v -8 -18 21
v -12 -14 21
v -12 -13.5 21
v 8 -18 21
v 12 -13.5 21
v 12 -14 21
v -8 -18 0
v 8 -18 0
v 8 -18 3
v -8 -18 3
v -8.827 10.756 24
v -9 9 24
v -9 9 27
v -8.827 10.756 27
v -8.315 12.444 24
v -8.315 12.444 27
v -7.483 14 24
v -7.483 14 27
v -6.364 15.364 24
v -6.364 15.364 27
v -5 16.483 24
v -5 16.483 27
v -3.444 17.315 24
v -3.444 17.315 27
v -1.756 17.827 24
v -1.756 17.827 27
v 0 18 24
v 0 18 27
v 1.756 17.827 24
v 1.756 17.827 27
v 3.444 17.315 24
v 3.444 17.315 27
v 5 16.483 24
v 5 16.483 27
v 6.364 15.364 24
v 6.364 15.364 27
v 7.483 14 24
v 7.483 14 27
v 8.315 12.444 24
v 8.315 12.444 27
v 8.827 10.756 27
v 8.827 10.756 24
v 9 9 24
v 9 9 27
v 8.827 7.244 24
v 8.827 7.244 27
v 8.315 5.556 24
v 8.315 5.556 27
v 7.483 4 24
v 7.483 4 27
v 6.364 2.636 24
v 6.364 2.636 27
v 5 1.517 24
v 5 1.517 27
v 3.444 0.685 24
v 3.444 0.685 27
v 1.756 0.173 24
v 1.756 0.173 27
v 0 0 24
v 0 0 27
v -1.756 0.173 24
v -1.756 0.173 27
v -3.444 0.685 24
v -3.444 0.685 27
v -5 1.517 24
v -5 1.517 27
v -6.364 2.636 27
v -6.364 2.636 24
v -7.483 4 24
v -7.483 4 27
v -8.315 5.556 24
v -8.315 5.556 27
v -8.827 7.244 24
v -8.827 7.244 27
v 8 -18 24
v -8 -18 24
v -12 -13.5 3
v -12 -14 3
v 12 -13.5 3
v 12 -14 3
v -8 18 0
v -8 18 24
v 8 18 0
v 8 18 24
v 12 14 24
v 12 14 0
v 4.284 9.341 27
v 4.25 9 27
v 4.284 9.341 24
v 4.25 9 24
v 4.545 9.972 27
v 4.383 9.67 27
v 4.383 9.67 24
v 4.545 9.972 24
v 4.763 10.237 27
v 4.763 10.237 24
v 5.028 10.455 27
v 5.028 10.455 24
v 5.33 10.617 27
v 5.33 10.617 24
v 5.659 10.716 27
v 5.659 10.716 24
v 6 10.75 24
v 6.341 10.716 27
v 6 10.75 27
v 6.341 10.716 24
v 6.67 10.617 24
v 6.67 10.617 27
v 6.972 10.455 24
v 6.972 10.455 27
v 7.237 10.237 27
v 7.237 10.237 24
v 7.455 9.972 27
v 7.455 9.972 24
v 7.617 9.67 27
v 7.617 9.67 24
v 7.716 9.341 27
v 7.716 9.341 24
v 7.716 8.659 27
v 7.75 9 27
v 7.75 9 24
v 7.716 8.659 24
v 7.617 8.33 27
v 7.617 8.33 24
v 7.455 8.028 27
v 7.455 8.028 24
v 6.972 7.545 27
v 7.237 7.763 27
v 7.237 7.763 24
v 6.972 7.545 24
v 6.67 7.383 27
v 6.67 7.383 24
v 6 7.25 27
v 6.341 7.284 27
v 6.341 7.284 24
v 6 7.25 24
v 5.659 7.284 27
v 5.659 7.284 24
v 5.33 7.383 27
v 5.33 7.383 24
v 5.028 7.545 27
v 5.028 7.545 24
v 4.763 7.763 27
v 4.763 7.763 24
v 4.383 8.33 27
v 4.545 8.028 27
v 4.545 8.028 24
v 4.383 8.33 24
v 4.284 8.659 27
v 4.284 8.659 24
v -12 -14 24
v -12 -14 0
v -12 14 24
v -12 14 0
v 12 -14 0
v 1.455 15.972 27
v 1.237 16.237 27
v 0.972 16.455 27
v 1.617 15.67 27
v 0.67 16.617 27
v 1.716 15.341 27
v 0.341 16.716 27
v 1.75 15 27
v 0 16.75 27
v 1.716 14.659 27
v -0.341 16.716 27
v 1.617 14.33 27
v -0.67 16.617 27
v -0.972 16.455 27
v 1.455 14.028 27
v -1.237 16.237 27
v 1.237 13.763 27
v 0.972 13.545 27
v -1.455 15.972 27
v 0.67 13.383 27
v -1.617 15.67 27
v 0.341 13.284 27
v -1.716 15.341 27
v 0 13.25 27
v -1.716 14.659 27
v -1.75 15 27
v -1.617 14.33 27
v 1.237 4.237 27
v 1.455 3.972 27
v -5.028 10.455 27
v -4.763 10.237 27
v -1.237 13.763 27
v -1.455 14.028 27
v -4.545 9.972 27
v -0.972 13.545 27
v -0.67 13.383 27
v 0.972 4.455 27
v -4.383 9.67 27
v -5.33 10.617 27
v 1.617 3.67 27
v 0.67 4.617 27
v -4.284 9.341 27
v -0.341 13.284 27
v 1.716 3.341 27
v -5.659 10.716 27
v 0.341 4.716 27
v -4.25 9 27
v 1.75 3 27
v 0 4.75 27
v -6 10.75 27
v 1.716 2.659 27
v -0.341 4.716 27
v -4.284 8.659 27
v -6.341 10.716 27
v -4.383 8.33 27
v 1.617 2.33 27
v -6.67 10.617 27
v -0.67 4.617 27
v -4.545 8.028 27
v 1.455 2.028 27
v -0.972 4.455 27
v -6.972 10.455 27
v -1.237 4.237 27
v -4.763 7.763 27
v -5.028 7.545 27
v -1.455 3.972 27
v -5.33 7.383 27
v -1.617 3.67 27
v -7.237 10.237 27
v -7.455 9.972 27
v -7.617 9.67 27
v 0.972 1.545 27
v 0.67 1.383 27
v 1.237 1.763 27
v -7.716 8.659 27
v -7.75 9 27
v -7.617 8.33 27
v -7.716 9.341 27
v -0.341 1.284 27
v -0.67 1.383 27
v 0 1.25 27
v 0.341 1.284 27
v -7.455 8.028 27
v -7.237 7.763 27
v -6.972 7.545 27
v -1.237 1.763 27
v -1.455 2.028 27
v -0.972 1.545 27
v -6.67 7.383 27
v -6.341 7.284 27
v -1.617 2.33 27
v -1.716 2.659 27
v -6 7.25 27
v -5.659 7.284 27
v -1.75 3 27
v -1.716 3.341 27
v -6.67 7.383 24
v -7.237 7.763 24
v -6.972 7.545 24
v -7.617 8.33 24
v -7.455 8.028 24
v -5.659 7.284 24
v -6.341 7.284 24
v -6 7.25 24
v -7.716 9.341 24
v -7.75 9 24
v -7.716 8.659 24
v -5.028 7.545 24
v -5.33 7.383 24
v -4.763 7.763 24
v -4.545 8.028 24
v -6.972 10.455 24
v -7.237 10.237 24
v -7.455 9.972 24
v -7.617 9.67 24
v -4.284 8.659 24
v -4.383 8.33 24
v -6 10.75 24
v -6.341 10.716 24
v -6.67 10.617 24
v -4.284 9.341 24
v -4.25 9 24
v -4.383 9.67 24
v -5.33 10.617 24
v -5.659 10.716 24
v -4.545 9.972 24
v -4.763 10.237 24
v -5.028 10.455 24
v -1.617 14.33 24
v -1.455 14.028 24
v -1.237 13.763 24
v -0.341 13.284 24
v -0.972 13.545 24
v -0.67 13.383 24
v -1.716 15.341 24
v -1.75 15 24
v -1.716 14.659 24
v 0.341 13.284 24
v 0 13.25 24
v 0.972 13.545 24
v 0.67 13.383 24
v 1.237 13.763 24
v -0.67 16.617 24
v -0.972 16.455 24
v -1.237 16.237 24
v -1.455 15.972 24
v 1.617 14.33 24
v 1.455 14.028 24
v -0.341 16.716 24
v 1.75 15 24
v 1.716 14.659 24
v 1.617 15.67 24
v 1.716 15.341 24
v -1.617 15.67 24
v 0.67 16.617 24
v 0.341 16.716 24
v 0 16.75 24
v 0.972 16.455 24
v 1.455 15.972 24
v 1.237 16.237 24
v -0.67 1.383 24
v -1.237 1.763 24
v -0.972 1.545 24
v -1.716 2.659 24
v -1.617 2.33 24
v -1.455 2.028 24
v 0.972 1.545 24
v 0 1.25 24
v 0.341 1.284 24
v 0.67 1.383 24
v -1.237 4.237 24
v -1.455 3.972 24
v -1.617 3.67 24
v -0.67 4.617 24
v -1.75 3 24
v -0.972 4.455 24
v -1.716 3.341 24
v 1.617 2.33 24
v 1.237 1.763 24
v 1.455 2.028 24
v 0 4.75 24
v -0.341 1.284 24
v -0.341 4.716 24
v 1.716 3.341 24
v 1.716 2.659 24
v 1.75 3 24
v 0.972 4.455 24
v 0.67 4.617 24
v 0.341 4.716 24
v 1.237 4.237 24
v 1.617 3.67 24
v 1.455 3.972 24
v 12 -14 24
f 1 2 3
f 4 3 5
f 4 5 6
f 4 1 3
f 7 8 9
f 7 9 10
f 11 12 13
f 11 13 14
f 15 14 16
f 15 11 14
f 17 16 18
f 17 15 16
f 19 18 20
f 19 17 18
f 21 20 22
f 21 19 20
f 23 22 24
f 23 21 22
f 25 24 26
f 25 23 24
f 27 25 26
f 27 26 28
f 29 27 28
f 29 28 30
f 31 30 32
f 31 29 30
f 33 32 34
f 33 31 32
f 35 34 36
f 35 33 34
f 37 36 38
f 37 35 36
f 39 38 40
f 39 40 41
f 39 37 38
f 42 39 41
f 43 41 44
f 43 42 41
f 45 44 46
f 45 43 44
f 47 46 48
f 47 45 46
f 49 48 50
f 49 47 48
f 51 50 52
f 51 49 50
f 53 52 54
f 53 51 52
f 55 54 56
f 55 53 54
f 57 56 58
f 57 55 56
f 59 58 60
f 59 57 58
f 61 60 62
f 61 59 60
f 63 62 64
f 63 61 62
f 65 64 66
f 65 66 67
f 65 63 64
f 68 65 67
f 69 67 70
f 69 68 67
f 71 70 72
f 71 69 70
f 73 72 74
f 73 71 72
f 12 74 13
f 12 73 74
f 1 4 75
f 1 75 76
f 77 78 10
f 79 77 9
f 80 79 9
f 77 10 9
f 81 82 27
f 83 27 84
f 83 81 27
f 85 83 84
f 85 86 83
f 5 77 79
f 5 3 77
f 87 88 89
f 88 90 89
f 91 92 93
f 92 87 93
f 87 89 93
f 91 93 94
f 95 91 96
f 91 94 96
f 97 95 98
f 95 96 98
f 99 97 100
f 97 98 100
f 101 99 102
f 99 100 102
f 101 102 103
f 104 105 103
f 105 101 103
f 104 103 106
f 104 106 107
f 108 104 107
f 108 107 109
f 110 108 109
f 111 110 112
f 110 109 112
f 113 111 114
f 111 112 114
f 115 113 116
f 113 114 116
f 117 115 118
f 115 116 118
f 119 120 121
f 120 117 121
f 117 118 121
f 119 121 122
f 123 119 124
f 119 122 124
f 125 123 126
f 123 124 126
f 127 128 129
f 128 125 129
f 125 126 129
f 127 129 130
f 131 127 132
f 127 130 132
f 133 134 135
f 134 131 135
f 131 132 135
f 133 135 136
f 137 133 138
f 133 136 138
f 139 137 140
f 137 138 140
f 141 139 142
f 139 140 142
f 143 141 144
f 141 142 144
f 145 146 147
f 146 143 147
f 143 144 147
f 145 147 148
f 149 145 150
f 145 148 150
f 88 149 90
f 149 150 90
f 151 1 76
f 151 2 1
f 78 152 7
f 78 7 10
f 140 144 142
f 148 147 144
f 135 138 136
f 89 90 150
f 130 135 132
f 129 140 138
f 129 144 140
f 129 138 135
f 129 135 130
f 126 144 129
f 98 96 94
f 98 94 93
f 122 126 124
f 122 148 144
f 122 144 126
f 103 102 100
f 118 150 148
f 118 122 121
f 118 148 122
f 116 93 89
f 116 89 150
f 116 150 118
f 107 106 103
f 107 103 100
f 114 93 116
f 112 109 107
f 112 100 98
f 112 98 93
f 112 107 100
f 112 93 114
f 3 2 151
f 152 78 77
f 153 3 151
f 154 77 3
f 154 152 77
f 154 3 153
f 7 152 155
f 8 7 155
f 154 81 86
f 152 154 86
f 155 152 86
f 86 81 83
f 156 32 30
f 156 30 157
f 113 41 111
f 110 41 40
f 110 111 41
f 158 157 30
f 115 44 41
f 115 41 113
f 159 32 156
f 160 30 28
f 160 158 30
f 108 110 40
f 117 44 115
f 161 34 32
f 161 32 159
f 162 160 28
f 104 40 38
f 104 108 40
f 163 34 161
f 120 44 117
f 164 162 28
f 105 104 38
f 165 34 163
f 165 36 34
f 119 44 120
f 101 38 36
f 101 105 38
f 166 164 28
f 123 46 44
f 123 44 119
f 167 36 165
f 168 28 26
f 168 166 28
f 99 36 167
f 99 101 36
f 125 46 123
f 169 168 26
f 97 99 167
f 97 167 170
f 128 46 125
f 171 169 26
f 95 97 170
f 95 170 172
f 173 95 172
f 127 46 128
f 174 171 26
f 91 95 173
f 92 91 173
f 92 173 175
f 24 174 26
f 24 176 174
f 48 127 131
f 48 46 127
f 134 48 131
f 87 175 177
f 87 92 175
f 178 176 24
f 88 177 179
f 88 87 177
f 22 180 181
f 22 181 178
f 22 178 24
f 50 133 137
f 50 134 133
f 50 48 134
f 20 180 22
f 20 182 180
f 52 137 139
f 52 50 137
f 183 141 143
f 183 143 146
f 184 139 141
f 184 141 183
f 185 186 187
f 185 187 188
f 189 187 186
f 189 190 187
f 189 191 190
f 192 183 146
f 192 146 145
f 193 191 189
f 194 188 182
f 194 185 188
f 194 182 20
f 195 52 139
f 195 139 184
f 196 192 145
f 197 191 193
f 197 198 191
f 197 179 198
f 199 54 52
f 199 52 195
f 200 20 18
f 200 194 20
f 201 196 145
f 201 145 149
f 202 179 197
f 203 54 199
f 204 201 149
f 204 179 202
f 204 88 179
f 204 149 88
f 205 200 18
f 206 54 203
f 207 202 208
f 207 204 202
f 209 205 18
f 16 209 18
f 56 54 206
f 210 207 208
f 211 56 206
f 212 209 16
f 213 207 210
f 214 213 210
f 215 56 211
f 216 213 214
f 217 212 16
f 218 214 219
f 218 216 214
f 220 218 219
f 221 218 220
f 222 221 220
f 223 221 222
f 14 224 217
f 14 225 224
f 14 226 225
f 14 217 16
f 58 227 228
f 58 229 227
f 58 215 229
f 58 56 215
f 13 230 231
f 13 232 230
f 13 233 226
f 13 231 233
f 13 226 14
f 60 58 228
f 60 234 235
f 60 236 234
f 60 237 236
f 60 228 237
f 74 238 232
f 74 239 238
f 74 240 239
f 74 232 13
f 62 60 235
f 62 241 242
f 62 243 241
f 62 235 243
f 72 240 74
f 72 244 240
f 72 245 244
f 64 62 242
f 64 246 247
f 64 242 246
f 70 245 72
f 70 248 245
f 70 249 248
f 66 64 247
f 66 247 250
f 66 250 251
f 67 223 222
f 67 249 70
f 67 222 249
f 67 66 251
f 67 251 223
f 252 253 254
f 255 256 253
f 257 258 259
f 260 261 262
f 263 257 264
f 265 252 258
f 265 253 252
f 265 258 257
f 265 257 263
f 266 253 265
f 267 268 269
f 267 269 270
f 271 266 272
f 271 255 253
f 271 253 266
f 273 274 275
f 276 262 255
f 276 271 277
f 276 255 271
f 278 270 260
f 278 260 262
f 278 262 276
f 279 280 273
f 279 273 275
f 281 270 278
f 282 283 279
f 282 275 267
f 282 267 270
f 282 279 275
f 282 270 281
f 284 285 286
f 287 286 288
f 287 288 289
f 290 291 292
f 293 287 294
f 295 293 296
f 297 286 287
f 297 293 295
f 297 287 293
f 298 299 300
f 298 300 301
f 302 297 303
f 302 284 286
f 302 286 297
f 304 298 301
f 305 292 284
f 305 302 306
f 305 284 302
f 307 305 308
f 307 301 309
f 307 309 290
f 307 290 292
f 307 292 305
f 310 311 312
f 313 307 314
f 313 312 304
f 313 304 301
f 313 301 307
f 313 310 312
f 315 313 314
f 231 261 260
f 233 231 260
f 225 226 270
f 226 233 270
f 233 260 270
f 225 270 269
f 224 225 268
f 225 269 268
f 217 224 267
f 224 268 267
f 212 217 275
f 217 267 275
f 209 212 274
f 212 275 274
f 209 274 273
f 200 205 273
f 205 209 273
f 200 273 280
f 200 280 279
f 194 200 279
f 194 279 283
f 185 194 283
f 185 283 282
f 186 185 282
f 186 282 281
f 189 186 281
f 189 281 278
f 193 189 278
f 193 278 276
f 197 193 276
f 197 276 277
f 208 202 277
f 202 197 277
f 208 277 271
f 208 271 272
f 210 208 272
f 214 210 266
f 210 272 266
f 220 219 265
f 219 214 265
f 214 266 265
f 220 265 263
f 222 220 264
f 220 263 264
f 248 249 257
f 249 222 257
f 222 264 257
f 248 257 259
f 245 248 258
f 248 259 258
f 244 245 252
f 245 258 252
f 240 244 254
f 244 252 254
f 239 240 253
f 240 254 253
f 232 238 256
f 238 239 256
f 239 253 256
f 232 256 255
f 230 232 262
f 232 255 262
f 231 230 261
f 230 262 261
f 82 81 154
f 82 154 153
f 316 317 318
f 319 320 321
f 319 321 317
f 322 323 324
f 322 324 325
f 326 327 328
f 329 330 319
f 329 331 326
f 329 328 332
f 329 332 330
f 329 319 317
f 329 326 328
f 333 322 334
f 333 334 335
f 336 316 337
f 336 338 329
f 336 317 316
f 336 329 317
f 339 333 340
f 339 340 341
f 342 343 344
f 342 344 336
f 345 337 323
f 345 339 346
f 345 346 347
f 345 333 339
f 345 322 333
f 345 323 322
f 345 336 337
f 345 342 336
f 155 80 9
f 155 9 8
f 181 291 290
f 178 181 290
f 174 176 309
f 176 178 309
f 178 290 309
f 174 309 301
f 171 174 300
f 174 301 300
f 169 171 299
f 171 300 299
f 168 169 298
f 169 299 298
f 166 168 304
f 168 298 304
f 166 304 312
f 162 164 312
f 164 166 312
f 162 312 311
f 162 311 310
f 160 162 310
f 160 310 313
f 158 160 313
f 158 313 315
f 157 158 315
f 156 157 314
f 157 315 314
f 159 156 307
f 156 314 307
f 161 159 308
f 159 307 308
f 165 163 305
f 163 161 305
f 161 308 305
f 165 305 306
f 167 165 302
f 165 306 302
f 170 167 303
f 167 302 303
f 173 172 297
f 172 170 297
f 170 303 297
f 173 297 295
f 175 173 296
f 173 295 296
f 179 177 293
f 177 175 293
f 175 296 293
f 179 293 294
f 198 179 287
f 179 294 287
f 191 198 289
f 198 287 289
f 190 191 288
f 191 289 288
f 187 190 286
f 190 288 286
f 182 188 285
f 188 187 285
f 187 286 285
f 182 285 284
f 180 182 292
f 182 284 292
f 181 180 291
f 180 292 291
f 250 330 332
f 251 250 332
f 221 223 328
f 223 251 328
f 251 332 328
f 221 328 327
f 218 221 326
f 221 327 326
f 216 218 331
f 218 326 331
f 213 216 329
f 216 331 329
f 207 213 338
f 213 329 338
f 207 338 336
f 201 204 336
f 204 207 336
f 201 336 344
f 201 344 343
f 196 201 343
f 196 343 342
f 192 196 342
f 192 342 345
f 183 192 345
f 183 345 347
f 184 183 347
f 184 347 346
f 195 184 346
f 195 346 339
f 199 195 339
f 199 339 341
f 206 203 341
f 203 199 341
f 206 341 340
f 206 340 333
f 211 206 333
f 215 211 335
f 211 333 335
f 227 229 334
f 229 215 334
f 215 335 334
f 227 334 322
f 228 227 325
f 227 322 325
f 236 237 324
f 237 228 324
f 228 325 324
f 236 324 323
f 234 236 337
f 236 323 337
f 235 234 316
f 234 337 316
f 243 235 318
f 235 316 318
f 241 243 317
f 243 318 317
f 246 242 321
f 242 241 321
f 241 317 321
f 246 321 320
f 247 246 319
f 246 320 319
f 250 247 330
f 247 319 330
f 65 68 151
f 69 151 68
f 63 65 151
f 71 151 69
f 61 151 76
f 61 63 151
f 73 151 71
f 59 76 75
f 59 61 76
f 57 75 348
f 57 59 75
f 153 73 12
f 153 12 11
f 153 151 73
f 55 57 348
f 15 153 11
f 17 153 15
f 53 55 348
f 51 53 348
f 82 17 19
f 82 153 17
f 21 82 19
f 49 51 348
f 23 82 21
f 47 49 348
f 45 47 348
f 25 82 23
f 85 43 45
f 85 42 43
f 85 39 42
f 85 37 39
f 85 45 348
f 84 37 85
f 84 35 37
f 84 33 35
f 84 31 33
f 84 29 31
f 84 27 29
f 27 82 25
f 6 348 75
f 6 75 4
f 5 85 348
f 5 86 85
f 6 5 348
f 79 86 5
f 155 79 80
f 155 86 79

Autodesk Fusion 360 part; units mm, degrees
sketch "Sketch1" plane through (0, 0, 0) normal (0, 0, 1) x (1, 0, 0)
  line L0 (12, -18) -> (-12, -18)
  line L1 (-12, -18) -> (-12, 18)
  line L2 (-12, 18) -> (12, 18)
  line L3 (12, 18) -> (12, -18)
  line L4 (12, -18) -> (-12, 18) construction
  line L5 (-12, -18) -> (12, 18) construction
  dimension "d1" = 36
  dimension "d2" = 24
extrude "Extrude1" add sketch "Sketch1" along normal blind 24
chamfer "Chamfer1" distance 4 angle 45 4 edges at (12, -18, 12) (12, 18, 12) (-12, -18, 12) (-12, 18, 12)
sketch "Sketch2" plane through (0, 0, 24) normal (0, 0, 1) x (-1, 0, 0)
  line L0 (8, -18) -> (12, -14)
  line L1 (12, -14) -> (12, 14)
  line L2 (12, 14) -> (8, 18)
  line L3 (8, 18) -> (-8, 18)
  line L4 (-8, 18) -> (-12, 14)
  line L5 (-12, 14) -> (-12, -14)
  line L6 (-12, -14) -> (-8, -18)
  line L7 (-8, -18) -> (8, -18)
  circle A0 centre (0, -9) radius 9
  circle A1 centre (0, -9) radius 6 construction
  line L8 (0, 0) -> (0, -18) construction
  circle A2 centre (0, -15) radius 1.75
  circle A3 centre (6, -9) radius 1.75
  circle A4 centre (0, -3) radius 1.75
  circle A5 centre (-6, -9) radius 1.75
  dimension "d6" = 18
  dimension "d7" = 12
  dimension "d8" = 3.5
  dimension "d10" = 360
extrude "Extrude2" add sketch "Sketch2" along normal blind 3 contours A0
sketch "Sketch3" plane through (0, -18, 0) normal (0, -1, 0) x (1, 0, 0)
  line L0 (-8, 24) -> (-8, 0)
  line L1 (-8, 0) -> (8, 0)
  line L2 (8, 0) -> (8, 24)
  line L3 (8, 24) -> (-8, 24)
  line L4 (-12, 0) -> (12, 0)
  line L5 (12, 0) -> (12, 24)
  line L6 (12, 24) -> (-12, 24)
  line L7 (-12, 24) -> (-12, 0)
  line L8 (-12, 21) -> (12, 21)
  line L9 (-12, 3) -> (12, 3)
  point P0 (-12, 24)
  point P1 (12, 24)
  point P2 (12, 0)
  point P3 (-12, 0)
  dimension "d13" = 3
  dimension "d14" = 3
extrude "Extrude3" cut sketch "Sketch3" against normal blind 4.5 contours L0 L2 L8 L9 | L0 L7 L8 L9 | L2 L5 L8 L9
sketch "Sketch5" plane through (0, 0, 24) normal (0, 0, 1) x (-1, 0, 0)
  line L0 (8, -18) -> (12, -14)
  line L1 (12, -14) -> (12, 14)
  line L2 (12, 14) -> (8, 18)
  line L3 (8, 18) -> (-8, 18)
  line L4 (-8, 18) -> (-12, 14)
  line L5 (-12, 14) -> (-12, -14)
  line L6 (-12, -14) -> (-8, -18)
  line L7 (-8, -18) -> (0, -18)
  circle A0 centre (0, -9) radius 9
  line L8 (0, -18) -> (8, -18)
  line L9 (12, 14) -> (-12, 14) construction
  line L10 (0, 14) -> (0, 18) construction
  line L11 (10, 16) -> (-10, 16) construction
  circle A1 centre (0, 16) radius 1.7
  circle A2 centre (-6, 16) radius 1.7
  circle A3 centre (6, 16) radius 1.7
  dimension "d17" = 3.4
  dimension "d20" = 6
  dimension "d21" = 0
extrude "Extrude4" cut sketch "Sketch5" along normal through all contours A1 | A2 | A3
